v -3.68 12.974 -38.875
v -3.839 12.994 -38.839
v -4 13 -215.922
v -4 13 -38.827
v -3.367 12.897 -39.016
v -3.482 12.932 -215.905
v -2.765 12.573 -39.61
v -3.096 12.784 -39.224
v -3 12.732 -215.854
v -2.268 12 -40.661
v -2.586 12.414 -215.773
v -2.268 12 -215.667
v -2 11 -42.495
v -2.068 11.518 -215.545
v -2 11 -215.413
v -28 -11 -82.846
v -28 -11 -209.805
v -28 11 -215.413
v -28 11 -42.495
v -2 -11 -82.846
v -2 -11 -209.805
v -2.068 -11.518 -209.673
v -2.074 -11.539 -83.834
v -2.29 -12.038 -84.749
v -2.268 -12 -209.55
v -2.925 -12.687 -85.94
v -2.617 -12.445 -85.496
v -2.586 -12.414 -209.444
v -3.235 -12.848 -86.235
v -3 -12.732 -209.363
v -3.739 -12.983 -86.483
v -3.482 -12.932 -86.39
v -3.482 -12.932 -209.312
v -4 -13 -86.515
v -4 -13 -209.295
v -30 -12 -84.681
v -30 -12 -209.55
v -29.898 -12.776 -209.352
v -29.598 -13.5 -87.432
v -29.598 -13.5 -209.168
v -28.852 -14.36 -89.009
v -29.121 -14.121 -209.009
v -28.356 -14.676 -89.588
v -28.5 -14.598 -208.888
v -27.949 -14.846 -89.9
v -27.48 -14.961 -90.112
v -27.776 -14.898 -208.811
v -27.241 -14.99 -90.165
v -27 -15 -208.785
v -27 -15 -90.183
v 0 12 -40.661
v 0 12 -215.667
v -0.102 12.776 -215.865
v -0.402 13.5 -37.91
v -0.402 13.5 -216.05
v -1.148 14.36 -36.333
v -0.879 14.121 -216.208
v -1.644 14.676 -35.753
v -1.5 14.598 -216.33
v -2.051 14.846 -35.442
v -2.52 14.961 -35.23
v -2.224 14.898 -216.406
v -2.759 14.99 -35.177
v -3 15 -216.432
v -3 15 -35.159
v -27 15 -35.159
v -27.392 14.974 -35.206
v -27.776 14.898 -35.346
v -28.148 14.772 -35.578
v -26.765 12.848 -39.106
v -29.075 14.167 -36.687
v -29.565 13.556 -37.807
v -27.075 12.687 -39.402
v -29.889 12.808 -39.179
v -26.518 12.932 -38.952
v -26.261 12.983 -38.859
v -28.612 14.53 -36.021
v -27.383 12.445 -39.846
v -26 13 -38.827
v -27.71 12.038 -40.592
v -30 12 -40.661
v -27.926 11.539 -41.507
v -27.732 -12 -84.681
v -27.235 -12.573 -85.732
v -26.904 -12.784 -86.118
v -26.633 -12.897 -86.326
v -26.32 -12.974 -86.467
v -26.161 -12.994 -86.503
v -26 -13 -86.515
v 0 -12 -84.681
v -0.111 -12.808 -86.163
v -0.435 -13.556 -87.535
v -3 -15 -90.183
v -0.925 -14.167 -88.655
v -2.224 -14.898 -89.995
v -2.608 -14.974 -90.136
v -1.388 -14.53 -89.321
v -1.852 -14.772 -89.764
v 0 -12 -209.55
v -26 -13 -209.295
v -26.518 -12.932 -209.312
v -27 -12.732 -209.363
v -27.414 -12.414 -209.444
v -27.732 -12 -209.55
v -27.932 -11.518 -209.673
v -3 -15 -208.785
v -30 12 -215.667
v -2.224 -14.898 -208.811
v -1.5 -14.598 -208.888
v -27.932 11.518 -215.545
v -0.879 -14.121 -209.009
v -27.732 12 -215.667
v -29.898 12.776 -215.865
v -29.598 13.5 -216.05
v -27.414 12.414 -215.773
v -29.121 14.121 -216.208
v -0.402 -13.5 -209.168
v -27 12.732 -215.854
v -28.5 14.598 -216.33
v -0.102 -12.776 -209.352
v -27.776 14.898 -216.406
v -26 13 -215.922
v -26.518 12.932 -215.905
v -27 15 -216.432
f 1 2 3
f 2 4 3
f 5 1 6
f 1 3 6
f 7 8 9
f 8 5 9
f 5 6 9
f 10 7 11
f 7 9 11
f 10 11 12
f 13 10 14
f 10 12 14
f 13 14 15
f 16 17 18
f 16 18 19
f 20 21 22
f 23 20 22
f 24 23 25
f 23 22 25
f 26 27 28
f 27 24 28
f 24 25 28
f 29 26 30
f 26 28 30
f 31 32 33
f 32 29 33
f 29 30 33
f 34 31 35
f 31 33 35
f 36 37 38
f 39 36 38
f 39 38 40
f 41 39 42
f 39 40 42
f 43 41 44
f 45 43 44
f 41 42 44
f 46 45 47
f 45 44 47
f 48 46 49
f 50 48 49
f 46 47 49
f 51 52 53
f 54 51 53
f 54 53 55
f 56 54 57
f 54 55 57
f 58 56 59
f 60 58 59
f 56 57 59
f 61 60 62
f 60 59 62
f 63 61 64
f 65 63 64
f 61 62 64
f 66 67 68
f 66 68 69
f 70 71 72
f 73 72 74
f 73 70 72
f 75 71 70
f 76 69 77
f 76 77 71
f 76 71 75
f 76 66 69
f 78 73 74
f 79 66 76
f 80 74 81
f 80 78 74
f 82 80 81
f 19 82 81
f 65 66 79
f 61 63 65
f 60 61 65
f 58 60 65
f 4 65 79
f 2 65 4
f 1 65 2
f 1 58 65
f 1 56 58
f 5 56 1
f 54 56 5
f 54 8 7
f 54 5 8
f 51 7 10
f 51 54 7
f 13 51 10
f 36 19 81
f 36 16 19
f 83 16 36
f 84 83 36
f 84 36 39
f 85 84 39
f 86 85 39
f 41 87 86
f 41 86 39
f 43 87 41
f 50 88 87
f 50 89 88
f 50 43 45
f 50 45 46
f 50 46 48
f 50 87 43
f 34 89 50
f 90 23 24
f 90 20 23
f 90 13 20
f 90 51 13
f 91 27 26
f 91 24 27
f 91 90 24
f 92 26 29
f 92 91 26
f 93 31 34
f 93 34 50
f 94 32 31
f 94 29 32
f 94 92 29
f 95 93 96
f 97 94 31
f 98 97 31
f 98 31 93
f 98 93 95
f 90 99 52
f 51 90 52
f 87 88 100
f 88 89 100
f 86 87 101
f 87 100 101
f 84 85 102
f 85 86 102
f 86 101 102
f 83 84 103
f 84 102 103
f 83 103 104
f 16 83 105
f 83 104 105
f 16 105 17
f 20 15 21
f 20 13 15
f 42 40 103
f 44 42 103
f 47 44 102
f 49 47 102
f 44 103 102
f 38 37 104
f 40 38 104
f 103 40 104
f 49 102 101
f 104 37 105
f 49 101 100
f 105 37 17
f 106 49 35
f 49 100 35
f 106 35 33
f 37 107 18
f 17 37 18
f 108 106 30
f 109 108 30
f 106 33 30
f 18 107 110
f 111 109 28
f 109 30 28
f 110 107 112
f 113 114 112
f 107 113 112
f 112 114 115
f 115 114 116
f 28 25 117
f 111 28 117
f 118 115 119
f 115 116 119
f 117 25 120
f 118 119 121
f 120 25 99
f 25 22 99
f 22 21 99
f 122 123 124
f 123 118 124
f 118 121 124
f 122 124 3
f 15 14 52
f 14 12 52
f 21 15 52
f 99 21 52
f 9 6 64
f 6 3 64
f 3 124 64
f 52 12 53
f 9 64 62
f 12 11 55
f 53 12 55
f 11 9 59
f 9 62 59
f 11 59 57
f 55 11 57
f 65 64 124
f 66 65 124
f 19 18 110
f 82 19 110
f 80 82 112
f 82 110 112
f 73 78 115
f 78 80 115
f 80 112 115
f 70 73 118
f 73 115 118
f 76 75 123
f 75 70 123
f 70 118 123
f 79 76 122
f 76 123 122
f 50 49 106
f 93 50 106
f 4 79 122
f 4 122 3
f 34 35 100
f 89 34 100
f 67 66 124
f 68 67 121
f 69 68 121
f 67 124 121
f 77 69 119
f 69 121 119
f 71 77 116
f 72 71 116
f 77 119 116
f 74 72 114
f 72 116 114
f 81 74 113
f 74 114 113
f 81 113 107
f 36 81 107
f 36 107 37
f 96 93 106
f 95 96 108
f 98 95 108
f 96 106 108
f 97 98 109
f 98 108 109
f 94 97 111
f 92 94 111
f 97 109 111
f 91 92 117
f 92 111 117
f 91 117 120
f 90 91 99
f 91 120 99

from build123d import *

# Parameters (mm, degrees)
EXTRUDE_START         = -216.432140614
EXTRUDE_2_DEPTH       = 216.432140614
EXTRUDE_START_2       = -214
EXTRUDE_2_2_OUTLINE_W = 32
EXTRUDE_2_2_OUTLINE_H = 33
EXTRUDE_2_2_DEPTH     = 7.978792001
CUT_EXTRUDE_1_DEPTH   = 220.015687774


with BuildPart() as part:
    # Бобышка-Вытянуть2: read off the stored shape, not the designer's step
    # Бобышка-Вытянуть2 outline → Бобышка-Вытянуть2 (new body)
    with BuildSketch(Plane.XY.offset(EXTRUDE_START)):
        with BuildLine():
            Line((-30, 12), (-30, -12))
            ThreePointArc((-30, -12), (-29.121320344, -14.121320344), (-27, -15))
            Line((-27, -15), (-3, -15))
            ThreePointArc((-3, -15), (-0.878679656, -14.121320344), (0, -12))
            Line((0, -12), (0, 12))
            ThreePointArc((0, 12), (-0.878679656, 14.121320344), (-3, 15))
            Line((-3, 15), (-27, 15))
            ThreePointArc((-27, 15), (-29.121320344, 14.121320344), (-30, 12))
        make_face()
        with BuildLine():
            ThreePointArc((-26, -13), (-27.414213562, -12.414213562), (-28, -11))
            Line((-28, -11), (-28, 11))
            ThreePointArc((-28, 11), (-27.414213562, 12.414213562), (-26, 13))
            Line((-26, 13), (-4, 13))
            ThreePointArc((-4, 13), (-2.585786438, 12.414213562), (-2, 11))
            Line((-2, 11), (-2, -11))
            ThreePointArc((-2, -11), (-2.585786438, -12.414213562), (-4, -13))
            Line((-4, -13), (-26, -13))
        make_face(mode=Mode.SUBTRACT)
    extrude(amount=EXTRUDE_2_DEPTH)

    # Extrude 2 2 outline → Extrude 2 2 (cut)
    with BuildSketch(Plane(origin=(0, 0, 0), x_dir=(1, 0, 0), z_dir=(0, 0.24699838348974407, 0.9690158917961322)).offset(EXTRUDE_START_2)):
        with Locations((-15, 52.5)):
            Rectangle(EXTRUDE_2_2_OUTLINE_W, EXTRUDE_2_2_OUTLINE_H)
    extrude(amount=EXTRUDE_2_2_DEPTH, mode=Mode.SUBTRACT)

    # Эскиз2 → Вырез-Вытянуть1 (cut, through all)
    with BuildSketch(Plane(origin=(0, 0, 0), x_dir=(0, 0, -1), z_dir=(1, 0, 0))):
        Polygon((-3.198950411, 35.913322267), (90.182976942, -15), (69.518016438, -52.902335865), (-23.863910916, -1.989013598), align=None)
    extrude(amount=-CUT_EXTRUDE_1_DEPTH, mode=Mode.SUBTRACT)


solid = part.part
